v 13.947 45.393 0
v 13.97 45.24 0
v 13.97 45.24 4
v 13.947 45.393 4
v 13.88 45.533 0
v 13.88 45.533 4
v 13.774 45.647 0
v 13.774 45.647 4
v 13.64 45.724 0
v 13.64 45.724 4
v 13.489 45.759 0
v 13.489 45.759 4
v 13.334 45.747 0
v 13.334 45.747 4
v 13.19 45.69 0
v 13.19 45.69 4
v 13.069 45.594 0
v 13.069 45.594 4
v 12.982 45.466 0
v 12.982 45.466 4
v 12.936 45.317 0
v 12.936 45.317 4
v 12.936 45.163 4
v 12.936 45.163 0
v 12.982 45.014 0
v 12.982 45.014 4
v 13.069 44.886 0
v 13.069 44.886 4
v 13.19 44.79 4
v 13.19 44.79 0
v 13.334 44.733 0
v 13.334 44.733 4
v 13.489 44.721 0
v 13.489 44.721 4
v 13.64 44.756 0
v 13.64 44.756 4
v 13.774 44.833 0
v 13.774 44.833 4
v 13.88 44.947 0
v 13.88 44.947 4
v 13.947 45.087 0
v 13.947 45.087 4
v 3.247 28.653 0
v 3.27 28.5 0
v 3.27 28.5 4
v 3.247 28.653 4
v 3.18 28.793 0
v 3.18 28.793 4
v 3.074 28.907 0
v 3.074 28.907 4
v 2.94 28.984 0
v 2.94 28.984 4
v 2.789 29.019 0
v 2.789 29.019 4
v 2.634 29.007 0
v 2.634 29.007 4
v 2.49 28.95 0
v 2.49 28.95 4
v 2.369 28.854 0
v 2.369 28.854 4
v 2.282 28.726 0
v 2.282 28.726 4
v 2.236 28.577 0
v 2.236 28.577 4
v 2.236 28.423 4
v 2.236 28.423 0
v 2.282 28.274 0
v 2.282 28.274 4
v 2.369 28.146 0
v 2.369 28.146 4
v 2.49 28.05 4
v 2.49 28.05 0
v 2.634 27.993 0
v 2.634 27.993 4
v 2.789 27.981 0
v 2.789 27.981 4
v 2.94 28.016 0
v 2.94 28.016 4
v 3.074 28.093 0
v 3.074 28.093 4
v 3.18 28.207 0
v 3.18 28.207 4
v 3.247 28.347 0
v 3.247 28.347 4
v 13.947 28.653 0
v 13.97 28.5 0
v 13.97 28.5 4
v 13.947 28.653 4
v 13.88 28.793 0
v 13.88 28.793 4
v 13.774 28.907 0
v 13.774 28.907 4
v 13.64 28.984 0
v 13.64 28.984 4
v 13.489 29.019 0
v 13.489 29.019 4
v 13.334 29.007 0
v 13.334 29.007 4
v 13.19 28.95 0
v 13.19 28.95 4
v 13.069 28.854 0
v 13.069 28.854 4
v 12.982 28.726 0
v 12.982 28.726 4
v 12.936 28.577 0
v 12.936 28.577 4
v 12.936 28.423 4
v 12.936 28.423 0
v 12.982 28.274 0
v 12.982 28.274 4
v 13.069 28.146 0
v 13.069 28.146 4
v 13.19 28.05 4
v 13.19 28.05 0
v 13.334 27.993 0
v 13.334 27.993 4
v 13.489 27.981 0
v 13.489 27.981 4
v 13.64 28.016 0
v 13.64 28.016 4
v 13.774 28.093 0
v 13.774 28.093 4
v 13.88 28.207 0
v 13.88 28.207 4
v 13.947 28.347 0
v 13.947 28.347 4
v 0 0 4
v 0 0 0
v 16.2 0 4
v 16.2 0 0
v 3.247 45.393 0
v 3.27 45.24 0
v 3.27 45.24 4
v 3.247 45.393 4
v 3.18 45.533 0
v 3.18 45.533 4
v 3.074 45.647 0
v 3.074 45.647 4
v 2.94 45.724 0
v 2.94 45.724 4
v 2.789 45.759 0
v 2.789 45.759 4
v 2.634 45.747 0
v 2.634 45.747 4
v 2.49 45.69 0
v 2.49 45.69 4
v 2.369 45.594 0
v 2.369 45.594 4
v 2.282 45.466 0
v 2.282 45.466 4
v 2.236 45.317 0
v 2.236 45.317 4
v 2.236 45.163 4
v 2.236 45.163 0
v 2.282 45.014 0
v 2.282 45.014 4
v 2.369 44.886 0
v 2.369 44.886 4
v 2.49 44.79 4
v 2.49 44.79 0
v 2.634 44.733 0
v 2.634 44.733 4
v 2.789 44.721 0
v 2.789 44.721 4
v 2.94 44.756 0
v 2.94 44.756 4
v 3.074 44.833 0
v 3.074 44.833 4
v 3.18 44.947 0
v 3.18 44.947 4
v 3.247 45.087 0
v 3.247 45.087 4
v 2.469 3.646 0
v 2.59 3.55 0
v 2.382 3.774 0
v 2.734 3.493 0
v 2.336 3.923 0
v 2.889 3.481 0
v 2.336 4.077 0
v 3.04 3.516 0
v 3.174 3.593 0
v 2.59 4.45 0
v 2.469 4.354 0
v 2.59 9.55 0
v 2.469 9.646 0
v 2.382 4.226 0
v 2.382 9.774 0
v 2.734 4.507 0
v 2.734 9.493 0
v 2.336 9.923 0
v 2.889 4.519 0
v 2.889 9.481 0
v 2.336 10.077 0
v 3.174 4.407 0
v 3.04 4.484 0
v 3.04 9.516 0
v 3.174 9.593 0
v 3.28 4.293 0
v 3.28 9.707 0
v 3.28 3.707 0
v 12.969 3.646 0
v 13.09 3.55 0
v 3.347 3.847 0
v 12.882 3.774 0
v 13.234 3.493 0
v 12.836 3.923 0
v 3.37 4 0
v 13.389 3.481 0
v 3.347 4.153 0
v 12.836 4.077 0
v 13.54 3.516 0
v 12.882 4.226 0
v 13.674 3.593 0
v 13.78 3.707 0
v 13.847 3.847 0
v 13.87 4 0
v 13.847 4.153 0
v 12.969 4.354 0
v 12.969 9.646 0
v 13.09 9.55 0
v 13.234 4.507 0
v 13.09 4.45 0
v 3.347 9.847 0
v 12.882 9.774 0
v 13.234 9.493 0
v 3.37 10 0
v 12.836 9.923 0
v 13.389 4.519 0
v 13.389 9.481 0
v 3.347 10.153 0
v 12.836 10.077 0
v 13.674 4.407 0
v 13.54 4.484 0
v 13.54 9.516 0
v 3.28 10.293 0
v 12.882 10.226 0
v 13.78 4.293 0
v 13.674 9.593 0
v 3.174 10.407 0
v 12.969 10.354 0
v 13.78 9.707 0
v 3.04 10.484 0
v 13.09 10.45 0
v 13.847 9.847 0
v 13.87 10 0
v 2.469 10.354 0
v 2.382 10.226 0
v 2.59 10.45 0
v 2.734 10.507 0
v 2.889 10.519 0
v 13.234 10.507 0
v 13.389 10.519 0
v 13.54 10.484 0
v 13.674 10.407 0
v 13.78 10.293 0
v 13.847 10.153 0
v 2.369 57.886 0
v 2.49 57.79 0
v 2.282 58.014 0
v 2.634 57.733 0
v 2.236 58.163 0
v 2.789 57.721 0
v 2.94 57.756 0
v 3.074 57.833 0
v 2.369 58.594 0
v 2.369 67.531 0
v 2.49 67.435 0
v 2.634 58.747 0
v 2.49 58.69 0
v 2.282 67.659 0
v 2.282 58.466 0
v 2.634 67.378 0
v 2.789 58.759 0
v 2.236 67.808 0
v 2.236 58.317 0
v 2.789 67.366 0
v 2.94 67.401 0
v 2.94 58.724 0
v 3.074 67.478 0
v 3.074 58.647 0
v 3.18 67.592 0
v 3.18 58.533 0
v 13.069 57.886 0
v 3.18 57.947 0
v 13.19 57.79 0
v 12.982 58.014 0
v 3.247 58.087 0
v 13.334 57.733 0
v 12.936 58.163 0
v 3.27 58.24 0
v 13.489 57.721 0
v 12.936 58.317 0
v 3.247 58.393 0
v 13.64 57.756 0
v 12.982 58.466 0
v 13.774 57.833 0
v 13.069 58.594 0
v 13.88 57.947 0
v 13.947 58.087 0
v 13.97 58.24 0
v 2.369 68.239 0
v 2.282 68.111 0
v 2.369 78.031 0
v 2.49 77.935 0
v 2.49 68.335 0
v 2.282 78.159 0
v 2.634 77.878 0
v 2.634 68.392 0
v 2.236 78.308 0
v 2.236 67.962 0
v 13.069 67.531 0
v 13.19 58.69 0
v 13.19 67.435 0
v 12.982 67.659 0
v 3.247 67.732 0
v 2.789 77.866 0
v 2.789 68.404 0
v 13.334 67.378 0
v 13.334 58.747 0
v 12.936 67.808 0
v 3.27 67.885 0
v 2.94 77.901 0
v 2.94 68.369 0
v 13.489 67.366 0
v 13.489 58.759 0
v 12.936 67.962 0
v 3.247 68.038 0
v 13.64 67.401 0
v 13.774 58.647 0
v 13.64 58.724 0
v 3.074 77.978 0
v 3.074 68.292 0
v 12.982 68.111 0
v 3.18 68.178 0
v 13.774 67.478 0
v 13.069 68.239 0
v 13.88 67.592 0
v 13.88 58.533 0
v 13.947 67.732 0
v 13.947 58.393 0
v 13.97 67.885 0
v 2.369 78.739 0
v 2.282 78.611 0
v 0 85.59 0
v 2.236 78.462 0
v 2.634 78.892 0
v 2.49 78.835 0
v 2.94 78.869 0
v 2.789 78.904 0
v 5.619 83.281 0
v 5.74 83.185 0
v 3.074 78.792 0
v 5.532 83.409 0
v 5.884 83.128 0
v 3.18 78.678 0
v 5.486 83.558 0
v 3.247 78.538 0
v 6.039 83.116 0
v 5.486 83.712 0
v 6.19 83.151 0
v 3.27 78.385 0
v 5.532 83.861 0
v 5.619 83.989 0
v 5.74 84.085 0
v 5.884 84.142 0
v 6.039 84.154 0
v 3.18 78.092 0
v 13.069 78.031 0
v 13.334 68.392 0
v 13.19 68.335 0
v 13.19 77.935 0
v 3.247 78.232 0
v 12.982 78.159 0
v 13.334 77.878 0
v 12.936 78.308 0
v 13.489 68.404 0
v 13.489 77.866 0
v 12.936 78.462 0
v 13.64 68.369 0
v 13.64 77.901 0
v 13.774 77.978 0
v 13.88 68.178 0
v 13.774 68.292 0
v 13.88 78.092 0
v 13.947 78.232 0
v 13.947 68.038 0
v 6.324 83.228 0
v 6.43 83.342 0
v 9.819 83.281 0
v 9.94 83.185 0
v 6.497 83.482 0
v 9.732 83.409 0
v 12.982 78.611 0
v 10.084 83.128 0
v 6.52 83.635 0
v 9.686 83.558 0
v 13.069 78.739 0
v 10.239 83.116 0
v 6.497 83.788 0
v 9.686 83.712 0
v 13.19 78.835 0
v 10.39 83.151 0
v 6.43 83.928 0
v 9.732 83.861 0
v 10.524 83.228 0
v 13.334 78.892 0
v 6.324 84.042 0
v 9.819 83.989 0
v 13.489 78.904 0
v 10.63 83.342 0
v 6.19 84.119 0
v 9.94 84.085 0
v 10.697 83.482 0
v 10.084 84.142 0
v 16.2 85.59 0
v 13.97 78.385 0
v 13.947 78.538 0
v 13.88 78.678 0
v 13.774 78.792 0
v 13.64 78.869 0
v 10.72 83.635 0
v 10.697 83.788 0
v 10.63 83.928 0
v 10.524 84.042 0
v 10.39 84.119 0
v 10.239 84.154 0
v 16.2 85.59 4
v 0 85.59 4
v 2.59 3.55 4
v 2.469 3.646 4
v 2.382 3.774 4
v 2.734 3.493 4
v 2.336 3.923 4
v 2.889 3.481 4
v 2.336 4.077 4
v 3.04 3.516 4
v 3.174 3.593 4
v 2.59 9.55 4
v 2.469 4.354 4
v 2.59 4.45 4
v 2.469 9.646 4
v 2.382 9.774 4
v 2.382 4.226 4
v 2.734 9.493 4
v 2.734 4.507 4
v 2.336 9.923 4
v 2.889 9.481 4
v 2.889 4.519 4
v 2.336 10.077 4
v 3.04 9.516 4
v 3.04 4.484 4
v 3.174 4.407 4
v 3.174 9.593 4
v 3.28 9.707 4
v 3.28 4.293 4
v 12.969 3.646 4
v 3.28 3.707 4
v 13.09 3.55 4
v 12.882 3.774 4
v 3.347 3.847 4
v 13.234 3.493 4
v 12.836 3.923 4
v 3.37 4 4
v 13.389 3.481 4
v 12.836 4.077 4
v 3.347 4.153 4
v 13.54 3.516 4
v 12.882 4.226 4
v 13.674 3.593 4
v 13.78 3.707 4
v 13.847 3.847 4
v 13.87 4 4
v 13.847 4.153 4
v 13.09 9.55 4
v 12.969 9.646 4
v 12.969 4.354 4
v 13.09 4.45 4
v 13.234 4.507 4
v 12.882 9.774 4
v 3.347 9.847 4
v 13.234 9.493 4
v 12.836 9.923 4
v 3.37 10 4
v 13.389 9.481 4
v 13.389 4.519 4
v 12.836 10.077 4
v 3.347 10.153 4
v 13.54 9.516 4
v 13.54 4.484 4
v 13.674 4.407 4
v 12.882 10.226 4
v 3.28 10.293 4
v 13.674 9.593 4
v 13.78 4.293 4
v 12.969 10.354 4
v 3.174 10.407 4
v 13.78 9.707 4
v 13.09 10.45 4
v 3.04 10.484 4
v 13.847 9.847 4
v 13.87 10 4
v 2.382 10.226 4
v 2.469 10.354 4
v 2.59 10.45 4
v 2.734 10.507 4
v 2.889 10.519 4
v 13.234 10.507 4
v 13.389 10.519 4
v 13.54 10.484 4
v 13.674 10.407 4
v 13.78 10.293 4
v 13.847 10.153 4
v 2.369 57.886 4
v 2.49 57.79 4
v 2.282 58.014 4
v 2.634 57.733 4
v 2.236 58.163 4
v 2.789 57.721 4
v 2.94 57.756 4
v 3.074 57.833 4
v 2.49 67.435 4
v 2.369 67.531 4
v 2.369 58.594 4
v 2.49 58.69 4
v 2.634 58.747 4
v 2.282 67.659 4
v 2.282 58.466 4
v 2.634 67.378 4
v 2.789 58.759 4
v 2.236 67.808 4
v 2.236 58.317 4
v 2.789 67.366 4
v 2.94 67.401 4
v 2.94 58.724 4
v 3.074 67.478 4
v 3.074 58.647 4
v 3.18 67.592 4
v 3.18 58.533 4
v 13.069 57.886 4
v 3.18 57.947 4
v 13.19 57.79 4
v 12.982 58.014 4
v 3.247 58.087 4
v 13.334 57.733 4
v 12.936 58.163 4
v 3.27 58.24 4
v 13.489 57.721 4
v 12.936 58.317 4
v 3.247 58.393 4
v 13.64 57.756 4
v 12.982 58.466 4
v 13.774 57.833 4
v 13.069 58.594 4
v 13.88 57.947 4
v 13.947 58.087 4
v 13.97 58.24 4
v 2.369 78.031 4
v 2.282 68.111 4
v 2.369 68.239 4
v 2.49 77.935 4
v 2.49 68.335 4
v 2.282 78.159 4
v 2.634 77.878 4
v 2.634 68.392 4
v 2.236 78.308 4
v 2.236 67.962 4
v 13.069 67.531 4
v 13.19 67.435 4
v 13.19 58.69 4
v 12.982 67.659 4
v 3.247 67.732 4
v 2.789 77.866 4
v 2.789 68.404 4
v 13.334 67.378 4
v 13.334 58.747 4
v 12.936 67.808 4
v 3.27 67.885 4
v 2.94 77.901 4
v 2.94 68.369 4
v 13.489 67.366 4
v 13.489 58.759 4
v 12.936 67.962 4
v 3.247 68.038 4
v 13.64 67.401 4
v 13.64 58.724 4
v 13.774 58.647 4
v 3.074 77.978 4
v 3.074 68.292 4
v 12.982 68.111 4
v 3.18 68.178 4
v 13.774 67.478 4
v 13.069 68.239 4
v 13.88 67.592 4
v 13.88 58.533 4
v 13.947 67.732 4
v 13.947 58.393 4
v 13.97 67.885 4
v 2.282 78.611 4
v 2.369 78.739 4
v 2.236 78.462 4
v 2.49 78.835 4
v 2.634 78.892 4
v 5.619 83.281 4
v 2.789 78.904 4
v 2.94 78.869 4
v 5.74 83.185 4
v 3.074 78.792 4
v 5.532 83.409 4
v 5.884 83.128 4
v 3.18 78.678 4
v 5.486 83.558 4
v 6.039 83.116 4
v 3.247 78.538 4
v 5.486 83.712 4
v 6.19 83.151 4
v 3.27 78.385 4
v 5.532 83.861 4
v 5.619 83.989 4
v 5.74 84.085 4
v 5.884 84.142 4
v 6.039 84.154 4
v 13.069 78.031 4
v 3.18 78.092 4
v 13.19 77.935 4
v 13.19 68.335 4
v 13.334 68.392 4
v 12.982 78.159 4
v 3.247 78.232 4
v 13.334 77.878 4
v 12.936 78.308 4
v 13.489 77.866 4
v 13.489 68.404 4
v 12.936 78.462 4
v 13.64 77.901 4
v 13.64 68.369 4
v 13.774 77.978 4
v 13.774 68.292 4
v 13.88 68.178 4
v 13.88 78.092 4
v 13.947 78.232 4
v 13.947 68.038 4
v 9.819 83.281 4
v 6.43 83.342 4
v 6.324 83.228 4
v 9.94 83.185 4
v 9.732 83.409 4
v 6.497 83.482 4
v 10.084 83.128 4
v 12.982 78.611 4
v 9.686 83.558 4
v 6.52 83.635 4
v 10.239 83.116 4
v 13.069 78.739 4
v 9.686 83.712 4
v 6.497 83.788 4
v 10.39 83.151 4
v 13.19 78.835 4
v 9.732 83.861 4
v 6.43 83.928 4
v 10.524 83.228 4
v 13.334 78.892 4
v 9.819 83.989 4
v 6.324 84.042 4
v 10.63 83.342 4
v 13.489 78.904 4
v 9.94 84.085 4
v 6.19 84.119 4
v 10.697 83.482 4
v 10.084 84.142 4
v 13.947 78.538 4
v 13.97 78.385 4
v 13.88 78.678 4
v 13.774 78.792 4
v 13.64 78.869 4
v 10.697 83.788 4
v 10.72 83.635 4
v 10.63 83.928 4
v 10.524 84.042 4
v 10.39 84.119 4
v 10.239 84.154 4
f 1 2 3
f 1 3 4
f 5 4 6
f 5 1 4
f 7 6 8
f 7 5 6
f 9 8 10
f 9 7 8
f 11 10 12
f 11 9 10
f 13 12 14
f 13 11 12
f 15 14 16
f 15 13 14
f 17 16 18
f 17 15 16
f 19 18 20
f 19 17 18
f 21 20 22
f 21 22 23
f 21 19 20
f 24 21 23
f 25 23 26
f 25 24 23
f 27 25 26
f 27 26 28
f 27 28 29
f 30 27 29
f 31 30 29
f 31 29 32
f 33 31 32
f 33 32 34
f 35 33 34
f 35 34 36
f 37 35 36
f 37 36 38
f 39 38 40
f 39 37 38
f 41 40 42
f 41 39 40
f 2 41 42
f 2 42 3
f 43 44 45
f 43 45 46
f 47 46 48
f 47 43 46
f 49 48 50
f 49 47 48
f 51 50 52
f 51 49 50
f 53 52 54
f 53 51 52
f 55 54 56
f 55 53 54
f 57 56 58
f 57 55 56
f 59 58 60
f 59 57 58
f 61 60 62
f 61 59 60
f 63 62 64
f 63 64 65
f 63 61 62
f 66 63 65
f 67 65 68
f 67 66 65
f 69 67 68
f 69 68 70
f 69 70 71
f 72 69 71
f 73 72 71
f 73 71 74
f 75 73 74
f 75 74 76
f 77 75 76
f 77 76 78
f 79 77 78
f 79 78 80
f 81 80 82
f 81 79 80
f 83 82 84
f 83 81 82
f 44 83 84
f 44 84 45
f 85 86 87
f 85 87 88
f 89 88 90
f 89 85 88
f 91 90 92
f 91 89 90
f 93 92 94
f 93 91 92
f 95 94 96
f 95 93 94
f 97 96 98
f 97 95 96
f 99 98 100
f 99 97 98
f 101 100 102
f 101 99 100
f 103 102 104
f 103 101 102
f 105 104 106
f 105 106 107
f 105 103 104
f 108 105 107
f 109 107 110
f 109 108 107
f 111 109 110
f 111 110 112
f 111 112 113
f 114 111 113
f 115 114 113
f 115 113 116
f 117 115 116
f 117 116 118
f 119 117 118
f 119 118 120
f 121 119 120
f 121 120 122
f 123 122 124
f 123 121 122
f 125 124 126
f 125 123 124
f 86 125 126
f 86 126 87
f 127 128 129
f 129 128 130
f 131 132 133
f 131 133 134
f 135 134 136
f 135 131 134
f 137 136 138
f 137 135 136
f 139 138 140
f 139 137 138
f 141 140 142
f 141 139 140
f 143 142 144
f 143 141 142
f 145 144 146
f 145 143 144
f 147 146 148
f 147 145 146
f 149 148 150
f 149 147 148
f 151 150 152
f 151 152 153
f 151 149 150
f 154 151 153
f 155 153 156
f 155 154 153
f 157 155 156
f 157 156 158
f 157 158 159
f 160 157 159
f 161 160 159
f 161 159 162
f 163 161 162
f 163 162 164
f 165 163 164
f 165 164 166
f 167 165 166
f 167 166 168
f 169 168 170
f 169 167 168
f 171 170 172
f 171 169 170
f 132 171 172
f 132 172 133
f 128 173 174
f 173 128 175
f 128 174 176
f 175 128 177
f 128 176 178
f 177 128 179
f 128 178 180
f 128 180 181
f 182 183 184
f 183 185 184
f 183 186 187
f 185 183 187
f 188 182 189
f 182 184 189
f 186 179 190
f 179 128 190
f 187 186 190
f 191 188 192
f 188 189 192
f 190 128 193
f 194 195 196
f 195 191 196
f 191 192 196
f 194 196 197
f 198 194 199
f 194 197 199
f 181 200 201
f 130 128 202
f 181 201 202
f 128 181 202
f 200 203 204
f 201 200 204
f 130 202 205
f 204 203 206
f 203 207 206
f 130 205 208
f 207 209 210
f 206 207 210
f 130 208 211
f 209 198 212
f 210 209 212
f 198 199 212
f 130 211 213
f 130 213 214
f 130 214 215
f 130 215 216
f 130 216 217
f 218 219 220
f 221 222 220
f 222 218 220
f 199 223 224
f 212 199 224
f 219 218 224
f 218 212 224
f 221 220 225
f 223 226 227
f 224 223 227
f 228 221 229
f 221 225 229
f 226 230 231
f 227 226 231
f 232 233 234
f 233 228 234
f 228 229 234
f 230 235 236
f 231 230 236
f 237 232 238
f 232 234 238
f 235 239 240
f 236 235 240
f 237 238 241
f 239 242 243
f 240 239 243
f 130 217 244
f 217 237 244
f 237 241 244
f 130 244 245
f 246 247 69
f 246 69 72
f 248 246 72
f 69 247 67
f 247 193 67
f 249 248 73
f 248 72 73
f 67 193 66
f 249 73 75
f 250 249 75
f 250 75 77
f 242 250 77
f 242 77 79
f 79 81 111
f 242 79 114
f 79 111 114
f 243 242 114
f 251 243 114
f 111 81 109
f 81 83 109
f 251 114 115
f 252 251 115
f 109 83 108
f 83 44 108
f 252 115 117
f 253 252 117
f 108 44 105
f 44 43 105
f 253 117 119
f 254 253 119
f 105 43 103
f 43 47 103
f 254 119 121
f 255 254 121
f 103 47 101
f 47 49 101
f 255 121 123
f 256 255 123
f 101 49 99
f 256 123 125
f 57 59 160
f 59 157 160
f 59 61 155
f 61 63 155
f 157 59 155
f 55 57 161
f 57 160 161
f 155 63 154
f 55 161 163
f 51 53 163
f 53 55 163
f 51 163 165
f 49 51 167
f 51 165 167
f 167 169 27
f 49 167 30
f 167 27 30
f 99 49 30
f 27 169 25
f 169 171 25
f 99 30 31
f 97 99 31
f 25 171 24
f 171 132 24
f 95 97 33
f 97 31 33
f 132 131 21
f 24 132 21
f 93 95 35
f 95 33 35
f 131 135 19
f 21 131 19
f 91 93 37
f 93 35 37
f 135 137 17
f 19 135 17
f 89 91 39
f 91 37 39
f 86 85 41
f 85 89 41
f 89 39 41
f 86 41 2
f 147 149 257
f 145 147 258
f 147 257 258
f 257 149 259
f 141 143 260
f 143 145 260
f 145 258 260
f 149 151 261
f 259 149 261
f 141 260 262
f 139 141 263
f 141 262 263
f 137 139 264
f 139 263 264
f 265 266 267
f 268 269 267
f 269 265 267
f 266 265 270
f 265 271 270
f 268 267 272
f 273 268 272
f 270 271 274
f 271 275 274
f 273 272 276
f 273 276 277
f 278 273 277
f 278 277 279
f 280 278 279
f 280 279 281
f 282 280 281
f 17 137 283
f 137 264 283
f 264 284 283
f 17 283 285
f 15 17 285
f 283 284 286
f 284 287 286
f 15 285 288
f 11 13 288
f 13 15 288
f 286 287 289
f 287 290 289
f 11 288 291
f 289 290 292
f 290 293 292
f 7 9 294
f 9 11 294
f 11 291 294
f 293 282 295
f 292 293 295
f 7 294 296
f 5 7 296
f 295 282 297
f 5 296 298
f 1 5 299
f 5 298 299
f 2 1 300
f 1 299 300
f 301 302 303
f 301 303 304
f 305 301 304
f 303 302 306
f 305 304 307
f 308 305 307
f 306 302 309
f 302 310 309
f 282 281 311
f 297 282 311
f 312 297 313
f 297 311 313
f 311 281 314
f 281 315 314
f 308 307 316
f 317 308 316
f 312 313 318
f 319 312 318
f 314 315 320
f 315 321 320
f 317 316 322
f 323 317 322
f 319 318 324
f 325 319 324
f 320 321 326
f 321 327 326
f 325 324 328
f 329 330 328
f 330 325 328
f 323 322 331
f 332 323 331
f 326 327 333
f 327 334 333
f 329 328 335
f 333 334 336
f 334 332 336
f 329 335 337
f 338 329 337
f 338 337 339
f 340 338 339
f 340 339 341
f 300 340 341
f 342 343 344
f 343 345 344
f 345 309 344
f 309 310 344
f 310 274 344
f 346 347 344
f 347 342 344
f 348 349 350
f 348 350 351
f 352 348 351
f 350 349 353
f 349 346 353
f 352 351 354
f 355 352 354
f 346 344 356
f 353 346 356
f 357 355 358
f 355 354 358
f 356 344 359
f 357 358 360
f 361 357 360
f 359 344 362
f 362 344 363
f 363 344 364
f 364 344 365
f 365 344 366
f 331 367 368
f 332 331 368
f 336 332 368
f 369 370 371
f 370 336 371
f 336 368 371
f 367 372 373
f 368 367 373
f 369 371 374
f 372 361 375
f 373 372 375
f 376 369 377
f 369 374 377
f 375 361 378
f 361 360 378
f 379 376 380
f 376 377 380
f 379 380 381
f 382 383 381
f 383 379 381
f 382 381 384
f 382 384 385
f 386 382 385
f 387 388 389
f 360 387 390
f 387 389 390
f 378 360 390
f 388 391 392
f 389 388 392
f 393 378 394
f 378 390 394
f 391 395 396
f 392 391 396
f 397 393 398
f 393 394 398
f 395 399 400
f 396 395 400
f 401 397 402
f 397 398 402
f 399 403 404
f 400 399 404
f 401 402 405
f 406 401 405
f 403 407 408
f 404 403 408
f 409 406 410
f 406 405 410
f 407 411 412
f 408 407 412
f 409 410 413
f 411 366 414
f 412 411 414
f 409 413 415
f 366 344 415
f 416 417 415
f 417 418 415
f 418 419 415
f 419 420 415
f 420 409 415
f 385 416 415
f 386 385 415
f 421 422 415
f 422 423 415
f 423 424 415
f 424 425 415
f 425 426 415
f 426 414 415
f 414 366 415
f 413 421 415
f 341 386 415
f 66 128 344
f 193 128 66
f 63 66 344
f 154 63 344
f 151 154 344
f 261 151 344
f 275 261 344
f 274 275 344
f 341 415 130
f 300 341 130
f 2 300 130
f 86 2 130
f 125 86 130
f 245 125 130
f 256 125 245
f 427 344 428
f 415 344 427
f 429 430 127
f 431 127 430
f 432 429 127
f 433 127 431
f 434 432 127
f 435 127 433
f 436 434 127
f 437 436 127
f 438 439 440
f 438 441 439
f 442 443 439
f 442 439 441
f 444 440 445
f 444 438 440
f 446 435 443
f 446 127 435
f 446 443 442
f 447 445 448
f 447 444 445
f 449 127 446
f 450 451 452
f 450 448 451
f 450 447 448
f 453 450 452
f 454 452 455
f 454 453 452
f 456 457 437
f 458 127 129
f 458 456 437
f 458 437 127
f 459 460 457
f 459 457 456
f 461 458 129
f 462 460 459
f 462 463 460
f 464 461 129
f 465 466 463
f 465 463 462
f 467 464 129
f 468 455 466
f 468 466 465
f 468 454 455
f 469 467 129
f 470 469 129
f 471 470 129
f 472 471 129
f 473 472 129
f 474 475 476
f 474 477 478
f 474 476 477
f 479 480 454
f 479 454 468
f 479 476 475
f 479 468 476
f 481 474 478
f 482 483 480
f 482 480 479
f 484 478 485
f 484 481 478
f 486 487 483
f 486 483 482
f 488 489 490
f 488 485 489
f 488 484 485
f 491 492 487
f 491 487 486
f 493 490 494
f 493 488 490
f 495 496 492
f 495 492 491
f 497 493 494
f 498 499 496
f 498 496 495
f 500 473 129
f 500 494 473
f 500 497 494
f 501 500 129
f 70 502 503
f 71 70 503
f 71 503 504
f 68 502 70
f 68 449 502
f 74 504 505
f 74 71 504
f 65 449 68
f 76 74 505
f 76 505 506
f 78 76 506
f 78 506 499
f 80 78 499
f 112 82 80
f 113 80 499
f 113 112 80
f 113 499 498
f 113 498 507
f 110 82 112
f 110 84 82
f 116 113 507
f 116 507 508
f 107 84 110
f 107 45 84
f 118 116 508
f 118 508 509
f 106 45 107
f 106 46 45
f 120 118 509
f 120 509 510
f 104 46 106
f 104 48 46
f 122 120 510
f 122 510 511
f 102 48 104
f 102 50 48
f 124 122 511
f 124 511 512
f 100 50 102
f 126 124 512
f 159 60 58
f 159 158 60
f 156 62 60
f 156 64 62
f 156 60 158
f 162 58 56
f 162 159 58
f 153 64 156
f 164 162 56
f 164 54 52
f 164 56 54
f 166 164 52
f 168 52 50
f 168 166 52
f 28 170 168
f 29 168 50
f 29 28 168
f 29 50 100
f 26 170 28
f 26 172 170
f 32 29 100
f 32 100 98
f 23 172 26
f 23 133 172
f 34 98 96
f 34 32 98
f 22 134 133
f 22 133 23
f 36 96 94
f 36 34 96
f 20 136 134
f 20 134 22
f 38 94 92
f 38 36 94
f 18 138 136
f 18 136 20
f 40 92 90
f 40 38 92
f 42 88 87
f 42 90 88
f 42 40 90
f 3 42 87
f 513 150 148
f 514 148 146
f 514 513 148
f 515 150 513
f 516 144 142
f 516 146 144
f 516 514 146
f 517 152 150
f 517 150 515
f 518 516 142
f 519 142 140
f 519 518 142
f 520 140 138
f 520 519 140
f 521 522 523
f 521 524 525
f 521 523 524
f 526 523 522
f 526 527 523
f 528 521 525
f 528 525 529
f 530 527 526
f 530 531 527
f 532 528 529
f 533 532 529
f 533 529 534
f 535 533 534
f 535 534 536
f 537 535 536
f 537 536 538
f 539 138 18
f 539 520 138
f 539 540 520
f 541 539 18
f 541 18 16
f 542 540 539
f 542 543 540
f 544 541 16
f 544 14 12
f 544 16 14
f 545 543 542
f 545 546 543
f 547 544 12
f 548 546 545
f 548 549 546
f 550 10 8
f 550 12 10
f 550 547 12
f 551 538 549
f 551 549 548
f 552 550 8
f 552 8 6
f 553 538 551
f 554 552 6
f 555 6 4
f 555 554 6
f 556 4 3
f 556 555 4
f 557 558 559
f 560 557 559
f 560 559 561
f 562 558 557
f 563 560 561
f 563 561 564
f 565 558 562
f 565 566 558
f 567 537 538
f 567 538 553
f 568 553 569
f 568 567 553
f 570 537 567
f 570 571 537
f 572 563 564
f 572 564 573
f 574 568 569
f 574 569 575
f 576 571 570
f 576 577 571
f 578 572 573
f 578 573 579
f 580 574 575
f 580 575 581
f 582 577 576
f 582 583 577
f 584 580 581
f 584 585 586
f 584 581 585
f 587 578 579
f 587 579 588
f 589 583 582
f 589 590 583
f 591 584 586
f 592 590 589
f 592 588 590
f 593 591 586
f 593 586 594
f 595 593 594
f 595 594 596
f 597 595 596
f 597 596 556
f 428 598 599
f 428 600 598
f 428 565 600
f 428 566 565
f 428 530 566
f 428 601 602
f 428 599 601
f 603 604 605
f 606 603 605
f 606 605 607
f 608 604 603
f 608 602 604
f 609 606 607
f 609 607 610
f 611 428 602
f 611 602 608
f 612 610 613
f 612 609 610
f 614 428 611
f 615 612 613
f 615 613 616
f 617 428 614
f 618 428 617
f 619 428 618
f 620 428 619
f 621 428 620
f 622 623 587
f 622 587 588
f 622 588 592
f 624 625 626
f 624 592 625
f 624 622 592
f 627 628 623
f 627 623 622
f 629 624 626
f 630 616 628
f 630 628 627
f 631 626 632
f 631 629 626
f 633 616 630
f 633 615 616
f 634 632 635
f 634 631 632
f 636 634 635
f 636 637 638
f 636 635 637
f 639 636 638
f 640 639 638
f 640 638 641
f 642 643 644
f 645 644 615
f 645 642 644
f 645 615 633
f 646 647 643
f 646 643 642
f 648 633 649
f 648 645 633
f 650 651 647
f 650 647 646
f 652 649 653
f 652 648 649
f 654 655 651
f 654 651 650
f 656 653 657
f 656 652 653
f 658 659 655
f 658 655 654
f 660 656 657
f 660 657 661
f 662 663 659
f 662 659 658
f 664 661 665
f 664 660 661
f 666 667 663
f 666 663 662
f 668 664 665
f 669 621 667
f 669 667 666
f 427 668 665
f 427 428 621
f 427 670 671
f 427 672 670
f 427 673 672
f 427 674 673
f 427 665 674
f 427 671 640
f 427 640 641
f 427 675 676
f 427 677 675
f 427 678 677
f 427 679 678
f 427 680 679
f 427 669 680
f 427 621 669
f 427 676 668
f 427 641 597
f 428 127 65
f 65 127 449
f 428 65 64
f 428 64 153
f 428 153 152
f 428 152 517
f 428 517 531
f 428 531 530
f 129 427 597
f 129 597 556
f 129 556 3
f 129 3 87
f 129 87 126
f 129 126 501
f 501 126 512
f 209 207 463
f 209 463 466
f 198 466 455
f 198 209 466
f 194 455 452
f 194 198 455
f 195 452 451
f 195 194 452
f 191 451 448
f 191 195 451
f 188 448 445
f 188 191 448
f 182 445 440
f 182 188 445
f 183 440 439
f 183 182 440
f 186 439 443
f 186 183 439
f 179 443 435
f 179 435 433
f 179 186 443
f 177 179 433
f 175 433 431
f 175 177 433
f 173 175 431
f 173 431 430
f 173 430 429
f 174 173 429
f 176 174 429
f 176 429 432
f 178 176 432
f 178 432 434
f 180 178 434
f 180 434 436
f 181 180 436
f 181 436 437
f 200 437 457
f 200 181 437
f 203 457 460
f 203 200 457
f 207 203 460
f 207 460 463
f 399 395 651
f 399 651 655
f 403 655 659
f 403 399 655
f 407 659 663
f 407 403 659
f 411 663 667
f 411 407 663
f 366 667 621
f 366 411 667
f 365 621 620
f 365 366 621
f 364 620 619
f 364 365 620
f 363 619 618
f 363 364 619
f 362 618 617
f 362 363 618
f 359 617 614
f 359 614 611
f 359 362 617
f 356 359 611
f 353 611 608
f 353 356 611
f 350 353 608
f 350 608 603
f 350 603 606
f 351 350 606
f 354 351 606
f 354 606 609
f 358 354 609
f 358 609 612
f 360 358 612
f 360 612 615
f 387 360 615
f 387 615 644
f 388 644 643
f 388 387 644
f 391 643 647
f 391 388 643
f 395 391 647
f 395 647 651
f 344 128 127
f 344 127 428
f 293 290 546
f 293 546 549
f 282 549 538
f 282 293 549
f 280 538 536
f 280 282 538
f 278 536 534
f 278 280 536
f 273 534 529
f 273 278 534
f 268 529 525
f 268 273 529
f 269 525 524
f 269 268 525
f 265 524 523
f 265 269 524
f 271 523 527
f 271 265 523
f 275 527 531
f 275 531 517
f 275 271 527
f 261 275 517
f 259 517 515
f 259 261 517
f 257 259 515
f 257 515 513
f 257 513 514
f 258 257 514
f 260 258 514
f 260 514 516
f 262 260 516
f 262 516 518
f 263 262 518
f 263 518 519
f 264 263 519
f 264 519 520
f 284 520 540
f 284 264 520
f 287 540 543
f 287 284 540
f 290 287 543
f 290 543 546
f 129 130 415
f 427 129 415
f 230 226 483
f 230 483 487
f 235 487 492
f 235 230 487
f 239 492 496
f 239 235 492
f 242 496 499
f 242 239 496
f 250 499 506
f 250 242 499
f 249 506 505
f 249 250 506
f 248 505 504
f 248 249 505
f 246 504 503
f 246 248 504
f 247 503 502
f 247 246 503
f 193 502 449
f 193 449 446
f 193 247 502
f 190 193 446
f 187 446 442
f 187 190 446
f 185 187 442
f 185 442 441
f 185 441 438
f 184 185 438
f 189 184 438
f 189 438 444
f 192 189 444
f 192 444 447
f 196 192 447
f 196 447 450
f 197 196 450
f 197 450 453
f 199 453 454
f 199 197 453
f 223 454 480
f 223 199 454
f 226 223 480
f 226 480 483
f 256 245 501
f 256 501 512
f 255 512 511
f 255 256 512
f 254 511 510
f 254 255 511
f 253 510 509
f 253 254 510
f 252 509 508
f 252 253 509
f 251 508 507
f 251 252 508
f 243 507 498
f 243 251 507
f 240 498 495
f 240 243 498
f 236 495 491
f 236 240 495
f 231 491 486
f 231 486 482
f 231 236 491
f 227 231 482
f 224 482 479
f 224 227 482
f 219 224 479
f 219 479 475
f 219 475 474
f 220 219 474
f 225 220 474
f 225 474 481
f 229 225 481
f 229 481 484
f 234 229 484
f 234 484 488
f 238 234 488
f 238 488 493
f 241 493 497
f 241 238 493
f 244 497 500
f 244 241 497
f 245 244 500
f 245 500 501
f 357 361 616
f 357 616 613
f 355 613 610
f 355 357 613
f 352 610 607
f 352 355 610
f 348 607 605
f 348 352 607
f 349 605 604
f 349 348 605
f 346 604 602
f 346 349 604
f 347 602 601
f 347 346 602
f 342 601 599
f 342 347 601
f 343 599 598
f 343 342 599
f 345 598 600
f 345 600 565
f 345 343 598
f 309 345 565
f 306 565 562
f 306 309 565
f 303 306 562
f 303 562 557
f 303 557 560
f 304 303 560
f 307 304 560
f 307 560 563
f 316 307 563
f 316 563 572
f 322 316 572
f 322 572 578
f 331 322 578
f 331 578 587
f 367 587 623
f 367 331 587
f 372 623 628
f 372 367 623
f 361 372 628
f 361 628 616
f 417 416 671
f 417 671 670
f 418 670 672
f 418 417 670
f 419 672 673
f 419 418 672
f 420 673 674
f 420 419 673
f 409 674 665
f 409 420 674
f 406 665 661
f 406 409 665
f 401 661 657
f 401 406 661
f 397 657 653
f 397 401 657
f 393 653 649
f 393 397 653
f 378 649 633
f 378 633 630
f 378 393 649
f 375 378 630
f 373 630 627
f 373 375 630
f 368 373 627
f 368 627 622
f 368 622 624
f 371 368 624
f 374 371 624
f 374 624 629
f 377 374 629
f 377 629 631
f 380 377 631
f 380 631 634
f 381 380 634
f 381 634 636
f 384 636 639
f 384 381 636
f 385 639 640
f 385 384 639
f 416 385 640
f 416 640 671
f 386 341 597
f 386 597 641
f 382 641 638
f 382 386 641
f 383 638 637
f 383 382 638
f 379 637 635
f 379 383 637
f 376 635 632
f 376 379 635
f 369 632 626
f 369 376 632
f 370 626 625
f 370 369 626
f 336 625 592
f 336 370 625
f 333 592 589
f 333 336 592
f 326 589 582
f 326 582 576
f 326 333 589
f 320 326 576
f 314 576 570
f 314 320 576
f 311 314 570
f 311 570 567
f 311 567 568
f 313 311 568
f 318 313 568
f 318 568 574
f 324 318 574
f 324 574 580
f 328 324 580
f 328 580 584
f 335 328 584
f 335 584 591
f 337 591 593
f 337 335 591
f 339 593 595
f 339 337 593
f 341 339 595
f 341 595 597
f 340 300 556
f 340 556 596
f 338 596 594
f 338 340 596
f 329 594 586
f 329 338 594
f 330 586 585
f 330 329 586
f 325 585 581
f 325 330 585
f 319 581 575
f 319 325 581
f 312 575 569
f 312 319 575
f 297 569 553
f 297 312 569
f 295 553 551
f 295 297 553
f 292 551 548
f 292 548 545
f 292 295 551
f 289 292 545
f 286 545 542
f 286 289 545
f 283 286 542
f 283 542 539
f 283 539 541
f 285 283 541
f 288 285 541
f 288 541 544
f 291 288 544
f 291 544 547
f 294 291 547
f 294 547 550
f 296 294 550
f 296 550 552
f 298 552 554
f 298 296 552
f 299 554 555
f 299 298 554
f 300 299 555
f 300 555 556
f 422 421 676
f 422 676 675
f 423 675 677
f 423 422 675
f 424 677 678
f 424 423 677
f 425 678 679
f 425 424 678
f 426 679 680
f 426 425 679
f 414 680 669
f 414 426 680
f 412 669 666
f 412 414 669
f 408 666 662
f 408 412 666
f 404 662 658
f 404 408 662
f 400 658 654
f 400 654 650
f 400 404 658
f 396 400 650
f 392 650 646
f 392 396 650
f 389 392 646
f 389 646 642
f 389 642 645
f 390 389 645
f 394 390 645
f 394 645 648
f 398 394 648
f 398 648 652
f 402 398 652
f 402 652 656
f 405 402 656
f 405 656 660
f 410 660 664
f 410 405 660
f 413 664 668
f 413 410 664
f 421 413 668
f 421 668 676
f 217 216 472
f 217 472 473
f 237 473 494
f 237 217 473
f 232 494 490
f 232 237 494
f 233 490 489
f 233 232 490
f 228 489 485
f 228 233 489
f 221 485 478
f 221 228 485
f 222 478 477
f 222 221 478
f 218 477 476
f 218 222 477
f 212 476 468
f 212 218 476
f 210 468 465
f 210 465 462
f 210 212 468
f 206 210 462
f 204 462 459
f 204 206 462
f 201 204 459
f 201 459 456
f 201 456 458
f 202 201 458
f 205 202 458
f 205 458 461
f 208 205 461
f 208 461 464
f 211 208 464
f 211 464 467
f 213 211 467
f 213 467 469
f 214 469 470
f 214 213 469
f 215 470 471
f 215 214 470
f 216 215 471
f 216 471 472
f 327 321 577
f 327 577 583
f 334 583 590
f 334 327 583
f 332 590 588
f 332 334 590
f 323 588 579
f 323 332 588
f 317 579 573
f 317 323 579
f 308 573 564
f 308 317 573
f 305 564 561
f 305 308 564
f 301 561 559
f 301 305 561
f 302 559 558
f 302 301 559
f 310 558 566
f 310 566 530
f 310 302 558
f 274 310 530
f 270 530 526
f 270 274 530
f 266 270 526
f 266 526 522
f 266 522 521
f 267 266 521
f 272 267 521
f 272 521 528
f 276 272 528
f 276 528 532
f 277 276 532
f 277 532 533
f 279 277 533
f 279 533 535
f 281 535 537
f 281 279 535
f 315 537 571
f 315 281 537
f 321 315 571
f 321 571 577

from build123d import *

# Parameters (mm, degrees)
SKETCH1_W           = 16.2
SKETCH1_H           = 85.59
SKETCH1_R           = 0.519960121
BOSS_EXTRUDE1_DEPTH = 4


with BuildPart() as part:
    # Sketch1 → Boss-Extrude1 (new body)
    with BuildSketch(Plane.XY):
        with Locations((8.1, 42.795)):
            Rectangle(SKETCH1_W, SKETCH1_H)
        with Locations((13.45, 45.24)):
            Circle(SKETCH1_R, mode=Mode.SUBTRACT)
        with Locations((2.75, 67.885)):
            Circle(SKETCH1_R, mode=Mode.SUBTRACT)
        with Locations((13.45, 58.24)):
            Circle(SKETCH1_R, mode=Mode.SUBTRACT)
        with Locations((13.45, 78.385)):
            Circle(SKETCH1_R, mode=Mode.SUBTRACT)
        with Locations((2.75, 28.5)):
            Circle(SKETCH1_R, mode=Mode.SUBTRACT)
        with Locations((2.75, 78.385)):
            Circle(SKETCH1_R, mode=Mode.SUBTRACT)
        with Locations((2.75, 58.24)):
            Circle(SKETCH1_R, mode=Mode.SUBTRACT)
        with Locations((2.85, 10)):
            Circle(SKETCH1_R, mode=Mode.SUBTRACT)
        with Locations((13.35, 10)):
            Circle(SKETCH1_R, mode=Mode.SUBTRACT)
        with Locations((13.35, 4)):
            Circle(SKETCH1_R, mode=Mode.SUBTRACT)
        with Locations((2.85, 4)):
            Circle(SKETCH1_R, mode=Mode.SUBTRACT)
        with Locations((6, 83.635)):
            Circle(SKETCH1_R, mode=Mode.SUBTRACT)
        with Locations((13.45, 28.5)):
            Circle(SKETCH1_R, mode=Mode.SUBTRACT)
        with Locations((13.45, 67.885)):
            Circle(SKETCH1_R, mode=Mode.SUBTRACT)
        with Locations((10.2, 83.635)):
            Circle(SKETCH1_R, mode=Mode.SUBTRACT)
        with Locations((2.75, 45.24)):
            Circle(SKETCH1_R, mode=Mode.SUBTRACT)
    extrude(amount=BOSS_EXTRUDE1_DEPTH)


solid = part.part
